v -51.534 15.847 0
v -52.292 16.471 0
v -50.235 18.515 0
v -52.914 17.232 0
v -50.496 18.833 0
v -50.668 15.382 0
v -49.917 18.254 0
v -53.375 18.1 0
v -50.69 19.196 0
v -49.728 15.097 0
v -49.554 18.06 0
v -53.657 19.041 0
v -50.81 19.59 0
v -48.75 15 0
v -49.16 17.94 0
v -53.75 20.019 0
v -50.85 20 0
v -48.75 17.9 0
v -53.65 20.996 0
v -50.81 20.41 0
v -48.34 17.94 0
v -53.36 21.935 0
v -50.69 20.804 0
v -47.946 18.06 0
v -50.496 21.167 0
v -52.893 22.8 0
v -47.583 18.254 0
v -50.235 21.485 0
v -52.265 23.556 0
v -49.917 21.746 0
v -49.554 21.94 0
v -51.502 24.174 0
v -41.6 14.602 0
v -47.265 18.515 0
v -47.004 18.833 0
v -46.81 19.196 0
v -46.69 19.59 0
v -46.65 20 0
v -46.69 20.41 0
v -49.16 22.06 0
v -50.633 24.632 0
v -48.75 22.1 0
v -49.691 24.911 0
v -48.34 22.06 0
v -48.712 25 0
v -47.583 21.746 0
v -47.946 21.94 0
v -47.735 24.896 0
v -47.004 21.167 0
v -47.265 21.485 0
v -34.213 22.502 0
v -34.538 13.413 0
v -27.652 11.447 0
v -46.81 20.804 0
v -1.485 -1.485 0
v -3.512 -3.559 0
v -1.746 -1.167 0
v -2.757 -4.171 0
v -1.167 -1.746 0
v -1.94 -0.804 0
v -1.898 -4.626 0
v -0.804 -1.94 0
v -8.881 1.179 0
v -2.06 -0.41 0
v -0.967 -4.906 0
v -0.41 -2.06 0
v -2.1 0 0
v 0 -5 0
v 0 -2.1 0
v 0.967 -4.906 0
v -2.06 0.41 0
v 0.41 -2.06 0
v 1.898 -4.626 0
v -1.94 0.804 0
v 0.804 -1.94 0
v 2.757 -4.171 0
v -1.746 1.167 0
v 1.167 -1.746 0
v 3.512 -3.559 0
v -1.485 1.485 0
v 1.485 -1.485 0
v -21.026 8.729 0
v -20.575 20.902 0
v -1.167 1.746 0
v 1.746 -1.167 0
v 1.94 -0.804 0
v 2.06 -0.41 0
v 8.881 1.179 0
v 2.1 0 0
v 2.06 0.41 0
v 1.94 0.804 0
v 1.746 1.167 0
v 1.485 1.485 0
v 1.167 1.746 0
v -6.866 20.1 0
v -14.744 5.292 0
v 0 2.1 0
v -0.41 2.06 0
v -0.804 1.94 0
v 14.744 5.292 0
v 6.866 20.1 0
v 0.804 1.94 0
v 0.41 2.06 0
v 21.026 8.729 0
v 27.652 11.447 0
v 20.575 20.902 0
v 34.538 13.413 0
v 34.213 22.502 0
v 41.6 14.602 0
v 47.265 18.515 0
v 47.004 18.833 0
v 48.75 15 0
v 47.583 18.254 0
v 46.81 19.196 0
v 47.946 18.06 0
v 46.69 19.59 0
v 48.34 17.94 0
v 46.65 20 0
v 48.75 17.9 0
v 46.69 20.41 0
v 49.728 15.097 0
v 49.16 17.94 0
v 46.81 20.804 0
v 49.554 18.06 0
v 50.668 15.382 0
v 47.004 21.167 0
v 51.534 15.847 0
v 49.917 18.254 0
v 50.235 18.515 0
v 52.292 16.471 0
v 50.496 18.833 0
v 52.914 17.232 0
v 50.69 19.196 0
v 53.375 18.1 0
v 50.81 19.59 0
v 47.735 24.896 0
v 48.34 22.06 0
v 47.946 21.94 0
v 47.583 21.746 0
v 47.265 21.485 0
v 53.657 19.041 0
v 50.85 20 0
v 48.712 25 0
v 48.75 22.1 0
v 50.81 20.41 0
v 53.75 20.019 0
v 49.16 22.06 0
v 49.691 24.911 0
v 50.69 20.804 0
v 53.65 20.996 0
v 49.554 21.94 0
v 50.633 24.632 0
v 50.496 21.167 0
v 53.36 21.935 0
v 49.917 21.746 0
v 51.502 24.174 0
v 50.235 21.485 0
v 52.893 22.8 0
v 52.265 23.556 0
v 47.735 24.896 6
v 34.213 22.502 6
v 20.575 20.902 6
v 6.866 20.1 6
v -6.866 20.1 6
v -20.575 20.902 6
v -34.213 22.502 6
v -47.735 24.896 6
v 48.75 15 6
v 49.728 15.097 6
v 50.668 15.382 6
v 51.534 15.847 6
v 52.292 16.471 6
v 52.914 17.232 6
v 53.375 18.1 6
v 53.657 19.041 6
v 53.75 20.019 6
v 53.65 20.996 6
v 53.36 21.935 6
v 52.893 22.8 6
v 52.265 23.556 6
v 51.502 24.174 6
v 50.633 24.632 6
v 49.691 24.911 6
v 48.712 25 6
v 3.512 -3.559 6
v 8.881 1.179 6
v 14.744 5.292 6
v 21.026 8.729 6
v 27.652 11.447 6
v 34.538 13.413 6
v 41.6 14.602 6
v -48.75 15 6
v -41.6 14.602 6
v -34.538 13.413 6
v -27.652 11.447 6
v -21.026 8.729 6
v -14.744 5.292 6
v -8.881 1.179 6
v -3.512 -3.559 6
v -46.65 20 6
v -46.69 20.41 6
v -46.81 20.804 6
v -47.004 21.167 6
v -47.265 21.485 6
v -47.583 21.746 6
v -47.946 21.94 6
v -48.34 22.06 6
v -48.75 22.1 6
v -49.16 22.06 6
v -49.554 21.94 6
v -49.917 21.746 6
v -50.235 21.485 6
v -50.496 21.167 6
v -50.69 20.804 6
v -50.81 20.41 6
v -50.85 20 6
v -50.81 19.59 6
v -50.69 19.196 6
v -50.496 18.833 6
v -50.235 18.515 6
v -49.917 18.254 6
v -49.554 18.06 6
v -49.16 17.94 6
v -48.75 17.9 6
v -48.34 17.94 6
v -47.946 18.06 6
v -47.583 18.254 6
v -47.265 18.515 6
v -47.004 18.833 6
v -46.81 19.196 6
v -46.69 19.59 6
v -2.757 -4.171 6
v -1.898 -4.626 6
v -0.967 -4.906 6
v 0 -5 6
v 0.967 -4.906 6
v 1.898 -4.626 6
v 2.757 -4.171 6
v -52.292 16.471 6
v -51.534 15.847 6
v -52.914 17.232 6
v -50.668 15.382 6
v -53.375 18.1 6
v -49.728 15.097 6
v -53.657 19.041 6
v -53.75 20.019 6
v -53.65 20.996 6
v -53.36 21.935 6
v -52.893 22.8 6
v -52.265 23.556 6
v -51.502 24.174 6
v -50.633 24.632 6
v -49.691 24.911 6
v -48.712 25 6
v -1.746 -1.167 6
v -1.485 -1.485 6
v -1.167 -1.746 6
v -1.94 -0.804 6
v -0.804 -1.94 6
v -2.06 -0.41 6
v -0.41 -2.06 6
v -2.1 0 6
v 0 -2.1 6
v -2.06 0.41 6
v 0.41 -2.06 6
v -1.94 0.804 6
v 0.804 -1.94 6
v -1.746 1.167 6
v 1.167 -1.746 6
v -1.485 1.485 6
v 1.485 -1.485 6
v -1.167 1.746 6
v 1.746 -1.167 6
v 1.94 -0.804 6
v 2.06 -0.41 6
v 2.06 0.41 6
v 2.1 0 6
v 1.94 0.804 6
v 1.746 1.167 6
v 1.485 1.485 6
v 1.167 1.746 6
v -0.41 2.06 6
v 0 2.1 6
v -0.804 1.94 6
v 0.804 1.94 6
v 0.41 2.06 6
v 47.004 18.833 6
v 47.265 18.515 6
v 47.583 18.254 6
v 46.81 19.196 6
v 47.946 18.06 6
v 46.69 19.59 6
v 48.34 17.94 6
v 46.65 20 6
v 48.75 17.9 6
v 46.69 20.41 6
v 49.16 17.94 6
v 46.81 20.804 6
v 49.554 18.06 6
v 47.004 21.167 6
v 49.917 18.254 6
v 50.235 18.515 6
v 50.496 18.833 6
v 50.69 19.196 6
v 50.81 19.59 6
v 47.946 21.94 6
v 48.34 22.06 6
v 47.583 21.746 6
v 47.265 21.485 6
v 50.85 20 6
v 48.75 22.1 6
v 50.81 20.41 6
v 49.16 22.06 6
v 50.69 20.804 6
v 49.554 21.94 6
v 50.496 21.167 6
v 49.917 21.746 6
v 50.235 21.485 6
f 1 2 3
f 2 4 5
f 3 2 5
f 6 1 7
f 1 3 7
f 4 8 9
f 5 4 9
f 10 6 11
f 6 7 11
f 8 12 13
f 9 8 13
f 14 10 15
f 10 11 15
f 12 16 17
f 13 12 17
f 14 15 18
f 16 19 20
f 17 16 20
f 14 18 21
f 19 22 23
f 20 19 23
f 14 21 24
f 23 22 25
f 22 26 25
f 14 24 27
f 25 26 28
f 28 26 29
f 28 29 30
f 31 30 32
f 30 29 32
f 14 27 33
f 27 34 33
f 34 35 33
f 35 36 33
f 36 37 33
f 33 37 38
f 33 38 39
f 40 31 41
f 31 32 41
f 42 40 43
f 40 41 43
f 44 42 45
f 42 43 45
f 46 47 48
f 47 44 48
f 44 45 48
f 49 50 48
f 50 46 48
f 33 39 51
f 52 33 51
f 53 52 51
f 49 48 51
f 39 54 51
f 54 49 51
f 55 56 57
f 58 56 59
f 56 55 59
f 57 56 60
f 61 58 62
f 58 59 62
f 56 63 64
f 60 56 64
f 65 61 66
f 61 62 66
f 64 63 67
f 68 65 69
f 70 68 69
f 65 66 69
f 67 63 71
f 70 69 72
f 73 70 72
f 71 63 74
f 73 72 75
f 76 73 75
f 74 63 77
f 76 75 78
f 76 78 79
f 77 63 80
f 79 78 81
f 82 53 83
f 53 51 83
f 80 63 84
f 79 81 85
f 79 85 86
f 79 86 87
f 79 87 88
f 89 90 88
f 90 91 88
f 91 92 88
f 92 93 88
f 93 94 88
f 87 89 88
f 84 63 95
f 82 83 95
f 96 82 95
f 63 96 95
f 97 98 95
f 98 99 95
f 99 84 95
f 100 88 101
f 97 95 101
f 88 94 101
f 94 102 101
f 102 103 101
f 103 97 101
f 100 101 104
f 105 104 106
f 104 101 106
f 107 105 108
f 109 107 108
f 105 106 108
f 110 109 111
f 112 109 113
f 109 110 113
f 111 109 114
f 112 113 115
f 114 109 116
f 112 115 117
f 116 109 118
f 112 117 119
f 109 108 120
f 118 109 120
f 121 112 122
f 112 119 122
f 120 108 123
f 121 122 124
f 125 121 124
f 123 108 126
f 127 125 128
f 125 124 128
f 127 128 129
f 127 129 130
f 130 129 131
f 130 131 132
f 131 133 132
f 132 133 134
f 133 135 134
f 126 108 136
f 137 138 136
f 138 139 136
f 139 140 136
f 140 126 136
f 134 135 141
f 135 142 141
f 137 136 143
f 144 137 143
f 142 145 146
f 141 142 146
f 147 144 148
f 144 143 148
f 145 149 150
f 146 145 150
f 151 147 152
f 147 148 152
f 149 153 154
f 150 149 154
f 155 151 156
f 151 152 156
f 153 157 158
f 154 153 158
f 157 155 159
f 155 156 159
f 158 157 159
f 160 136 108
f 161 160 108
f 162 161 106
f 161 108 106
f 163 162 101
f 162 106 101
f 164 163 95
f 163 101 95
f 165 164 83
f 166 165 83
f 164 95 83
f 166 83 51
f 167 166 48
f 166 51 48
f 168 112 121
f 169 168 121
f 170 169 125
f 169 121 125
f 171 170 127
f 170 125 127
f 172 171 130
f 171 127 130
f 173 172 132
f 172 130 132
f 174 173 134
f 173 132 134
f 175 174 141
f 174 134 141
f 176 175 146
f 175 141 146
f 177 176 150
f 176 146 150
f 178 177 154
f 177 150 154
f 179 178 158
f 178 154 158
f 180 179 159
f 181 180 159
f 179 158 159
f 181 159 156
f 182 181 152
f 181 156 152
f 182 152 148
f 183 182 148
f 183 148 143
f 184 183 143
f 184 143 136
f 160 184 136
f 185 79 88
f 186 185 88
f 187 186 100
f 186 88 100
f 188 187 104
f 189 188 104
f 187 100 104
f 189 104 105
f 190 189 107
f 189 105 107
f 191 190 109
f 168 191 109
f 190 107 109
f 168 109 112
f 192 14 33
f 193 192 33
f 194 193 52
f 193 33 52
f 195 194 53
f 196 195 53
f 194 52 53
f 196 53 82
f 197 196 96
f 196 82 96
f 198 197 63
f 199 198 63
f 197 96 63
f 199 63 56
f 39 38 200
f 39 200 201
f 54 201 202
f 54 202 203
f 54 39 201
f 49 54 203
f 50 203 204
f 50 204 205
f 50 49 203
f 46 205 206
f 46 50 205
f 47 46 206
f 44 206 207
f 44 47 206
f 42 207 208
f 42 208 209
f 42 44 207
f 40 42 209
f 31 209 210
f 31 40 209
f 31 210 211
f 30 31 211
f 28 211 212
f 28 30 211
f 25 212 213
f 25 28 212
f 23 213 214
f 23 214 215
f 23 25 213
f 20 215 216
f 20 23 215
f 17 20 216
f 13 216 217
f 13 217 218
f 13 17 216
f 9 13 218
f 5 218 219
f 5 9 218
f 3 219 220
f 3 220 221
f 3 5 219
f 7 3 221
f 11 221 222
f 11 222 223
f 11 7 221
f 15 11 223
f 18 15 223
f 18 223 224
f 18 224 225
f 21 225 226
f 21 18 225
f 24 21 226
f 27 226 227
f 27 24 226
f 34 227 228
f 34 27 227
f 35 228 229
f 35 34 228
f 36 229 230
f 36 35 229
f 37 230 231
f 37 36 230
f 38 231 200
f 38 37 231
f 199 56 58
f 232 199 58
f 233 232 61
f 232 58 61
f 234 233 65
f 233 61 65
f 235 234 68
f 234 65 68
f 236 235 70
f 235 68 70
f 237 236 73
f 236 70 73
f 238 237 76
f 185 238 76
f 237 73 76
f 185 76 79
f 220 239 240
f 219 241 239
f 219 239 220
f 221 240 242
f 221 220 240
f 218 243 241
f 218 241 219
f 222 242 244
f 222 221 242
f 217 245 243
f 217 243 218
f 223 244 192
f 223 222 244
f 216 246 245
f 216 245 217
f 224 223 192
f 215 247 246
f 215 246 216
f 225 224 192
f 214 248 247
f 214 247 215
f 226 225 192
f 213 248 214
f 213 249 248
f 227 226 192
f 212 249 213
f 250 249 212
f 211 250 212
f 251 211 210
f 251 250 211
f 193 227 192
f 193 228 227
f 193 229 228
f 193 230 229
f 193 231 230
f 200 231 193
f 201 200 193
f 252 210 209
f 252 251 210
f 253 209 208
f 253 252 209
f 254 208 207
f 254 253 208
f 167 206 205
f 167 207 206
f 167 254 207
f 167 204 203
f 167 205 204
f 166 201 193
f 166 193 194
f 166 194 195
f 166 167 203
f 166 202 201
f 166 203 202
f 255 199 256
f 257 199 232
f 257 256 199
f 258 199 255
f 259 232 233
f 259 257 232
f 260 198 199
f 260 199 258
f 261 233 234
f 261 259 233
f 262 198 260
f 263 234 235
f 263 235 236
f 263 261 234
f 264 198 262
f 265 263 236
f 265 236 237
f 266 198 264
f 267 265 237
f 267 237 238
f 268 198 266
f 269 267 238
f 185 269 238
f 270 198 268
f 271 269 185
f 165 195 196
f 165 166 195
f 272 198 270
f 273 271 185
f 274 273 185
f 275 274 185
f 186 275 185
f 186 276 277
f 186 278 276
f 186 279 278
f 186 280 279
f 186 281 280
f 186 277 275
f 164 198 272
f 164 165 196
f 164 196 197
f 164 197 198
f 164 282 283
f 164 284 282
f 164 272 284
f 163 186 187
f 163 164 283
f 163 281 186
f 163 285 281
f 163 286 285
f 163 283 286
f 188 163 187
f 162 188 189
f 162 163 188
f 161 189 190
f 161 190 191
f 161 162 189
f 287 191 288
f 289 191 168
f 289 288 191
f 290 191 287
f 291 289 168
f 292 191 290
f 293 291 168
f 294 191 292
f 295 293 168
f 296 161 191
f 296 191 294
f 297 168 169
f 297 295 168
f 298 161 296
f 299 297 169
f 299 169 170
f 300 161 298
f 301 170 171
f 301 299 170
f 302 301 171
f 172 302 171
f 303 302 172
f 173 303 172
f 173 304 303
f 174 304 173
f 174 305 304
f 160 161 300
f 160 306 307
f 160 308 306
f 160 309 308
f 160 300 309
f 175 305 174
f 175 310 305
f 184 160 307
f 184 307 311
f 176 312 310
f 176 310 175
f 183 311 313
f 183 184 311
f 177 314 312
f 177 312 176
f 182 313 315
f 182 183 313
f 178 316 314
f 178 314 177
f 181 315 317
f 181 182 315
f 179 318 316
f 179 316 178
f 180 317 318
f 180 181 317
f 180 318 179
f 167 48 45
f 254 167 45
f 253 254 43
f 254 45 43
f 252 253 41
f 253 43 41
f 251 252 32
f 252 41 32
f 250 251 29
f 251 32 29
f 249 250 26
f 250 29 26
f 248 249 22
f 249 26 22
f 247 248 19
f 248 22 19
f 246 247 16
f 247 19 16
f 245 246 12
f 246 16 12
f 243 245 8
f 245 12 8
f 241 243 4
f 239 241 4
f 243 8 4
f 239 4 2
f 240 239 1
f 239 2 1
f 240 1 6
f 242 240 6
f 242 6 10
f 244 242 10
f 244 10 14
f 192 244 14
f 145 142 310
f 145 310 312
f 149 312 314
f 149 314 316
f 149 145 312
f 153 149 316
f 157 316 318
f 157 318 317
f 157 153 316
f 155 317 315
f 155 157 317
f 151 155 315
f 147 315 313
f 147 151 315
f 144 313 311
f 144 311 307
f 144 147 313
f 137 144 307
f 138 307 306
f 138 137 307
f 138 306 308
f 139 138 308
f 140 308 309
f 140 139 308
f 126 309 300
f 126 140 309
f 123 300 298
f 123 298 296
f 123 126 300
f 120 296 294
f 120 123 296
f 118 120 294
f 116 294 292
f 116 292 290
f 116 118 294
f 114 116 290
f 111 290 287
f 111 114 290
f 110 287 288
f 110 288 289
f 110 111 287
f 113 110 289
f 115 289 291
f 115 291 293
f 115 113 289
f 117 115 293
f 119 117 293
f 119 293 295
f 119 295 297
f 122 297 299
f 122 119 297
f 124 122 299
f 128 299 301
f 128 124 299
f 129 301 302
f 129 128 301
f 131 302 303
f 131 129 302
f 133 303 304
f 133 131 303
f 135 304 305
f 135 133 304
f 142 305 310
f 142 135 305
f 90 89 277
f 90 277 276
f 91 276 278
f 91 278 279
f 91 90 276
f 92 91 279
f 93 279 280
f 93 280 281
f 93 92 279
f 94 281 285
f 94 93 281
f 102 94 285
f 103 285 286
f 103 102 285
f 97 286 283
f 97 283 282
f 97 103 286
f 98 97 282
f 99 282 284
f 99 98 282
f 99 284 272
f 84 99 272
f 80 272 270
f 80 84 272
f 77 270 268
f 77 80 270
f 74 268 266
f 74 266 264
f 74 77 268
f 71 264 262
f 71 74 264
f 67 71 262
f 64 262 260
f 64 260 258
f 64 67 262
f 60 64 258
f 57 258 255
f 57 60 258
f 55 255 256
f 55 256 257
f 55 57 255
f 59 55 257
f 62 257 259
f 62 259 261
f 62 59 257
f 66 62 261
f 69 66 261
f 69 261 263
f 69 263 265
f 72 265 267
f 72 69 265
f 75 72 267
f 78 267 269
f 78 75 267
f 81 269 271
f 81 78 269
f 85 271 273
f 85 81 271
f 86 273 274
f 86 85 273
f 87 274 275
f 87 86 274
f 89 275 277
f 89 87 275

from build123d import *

# Parameters (mm, degrees)
SKETCH1_R           = 2.1
BOSS_EXTRUDE1_DEPTH = 6


with BuildPart() as part:
    # Sketch1 → Boss-Extrude1 (new body)
    with BuildSketch(Plane.XY):
        with BuildLine():
            ThreePointArc((3.511536297, -3.559369724), (24.301233146, 10.179806707), (48.75, 15))
            ThreePointArc((48.75, 15), (53.723907193, 20.510144327), (47.735035784, 24.895901106))
            ThreePointArc((47.735035784, 24.895901106), (0, 20), (-47.735035784, 24.895901106))
            ThreePointArc((-47.735035784, 24.895901106), (-53.723907193, 20.510144327), (-48.75, 15))
            ThreePointArc((-48.75, 15), (-24.301233146, 10.179806707), (-3.511536297, -3.559369724))
            ThreePointArc((-3.511536297, -3.559369724), (0, -5), (3.511536297, -3.559369724))
        make_face()
        Circle(SKETCH1_R, mode=Mode.SUBTRACT)
        with Locations((-48.75, 20)):
            Circle(SKETCH1_R, mode=Mode.SUBTRACT)
        with Locations((48.75, 20)):
            Circle(SKETCH1_R, mode=Mode.SUBTRACT)
    extrude(amount=BOSS_EXTRUDE1_DEPTH)


solid = part.part
